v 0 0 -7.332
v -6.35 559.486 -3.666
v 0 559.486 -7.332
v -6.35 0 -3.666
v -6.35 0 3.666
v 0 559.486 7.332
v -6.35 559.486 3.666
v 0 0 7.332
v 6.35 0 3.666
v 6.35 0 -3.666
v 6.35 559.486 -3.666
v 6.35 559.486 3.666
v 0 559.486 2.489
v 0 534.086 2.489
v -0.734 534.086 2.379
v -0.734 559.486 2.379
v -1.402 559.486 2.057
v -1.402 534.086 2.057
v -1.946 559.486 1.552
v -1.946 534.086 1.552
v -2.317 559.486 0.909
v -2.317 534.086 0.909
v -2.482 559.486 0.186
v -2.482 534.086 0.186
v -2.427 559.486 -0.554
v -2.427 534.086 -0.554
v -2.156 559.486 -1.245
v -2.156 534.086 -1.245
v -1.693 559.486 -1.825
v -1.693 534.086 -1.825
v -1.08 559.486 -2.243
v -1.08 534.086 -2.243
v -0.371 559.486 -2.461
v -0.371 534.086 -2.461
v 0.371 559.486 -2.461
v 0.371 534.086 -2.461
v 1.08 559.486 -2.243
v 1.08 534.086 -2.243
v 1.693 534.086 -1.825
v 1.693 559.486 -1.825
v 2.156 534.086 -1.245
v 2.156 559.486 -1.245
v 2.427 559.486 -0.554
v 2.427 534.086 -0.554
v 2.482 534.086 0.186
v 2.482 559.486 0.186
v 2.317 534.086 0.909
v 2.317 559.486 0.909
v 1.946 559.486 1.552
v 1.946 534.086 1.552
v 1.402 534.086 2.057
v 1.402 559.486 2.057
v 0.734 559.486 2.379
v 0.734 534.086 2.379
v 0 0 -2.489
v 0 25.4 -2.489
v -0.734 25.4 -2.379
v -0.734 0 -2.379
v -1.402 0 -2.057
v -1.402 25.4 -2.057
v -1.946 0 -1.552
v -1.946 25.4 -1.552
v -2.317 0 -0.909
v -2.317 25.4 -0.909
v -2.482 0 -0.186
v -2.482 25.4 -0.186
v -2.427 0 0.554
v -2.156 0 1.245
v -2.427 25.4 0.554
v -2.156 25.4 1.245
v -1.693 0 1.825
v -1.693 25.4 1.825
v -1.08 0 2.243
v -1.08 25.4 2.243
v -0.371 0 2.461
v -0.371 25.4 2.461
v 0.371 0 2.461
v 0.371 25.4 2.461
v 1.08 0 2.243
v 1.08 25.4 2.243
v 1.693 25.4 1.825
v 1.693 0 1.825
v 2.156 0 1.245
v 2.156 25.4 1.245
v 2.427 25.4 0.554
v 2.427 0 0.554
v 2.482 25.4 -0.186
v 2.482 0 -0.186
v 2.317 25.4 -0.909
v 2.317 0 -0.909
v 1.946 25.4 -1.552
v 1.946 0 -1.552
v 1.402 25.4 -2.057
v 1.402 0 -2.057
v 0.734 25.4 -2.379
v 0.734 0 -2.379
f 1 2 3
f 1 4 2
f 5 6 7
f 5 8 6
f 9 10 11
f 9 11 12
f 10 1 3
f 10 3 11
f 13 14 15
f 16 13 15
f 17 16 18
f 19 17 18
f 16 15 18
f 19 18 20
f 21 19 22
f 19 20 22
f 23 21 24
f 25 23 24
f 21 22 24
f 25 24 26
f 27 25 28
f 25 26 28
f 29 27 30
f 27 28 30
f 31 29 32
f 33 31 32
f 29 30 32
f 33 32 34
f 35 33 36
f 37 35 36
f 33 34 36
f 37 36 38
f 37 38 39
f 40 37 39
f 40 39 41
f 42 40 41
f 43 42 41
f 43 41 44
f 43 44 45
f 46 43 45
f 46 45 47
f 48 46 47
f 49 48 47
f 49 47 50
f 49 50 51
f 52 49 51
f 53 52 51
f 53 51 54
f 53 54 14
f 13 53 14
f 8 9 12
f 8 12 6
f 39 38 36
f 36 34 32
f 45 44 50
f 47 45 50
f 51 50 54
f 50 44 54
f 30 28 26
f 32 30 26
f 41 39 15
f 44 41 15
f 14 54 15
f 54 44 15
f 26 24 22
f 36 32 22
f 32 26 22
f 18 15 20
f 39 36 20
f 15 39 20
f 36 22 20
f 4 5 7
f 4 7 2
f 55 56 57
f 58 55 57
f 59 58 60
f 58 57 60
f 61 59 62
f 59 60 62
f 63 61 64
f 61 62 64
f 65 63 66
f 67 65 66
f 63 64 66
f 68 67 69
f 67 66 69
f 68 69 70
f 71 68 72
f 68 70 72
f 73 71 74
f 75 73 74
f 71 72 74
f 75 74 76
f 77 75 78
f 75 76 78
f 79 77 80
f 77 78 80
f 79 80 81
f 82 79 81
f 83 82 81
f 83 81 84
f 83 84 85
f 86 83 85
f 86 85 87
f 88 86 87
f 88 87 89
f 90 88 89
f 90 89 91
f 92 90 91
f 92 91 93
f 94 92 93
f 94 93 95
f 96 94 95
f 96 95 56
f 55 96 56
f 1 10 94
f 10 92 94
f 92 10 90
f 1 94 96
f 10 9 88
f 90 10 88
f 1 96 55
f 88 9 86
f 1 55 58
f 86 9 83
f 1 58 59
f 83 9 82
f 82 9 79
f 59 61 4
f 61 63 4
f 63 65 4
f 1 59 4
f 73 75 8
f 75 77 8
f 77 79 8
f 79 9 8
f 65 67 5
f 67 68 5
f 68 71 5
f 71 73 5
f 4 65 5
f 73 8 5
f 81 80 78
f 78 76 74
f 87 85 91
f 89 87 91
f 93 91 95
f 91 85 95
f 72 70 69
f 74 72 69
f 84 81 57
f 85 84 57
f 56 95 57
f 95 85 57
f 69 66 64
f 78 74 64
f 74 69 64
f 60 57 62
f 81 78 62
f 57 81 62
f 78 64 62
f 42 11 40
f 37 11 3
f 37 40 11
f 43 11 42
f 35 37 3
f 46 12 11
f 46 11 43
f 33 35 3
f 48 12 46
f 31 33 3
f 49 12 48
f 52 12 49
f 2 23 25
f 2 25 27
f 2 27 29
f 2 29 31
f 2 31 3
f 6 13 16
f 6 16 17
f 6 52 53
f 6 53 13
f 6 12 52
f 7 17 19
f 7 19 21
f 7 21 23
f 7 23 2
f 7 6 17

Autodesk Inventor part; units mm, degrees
ref_plane "YZ Plane" through (0, 0, 0) normal (1, 0, 0) x (0, 1, 0)
ref_plane "XZ Plane" through (0, 0, 0) normal (0, 1, 0) x (-1, 0, 0)
ref_plane "XY Plane" through (0, 0, 0) normal (0, 0, 1) x (1, 0, 0)
sketch "Sketch1" plane through (0, 0, 0) normal (0, 1, 0) x (-1, 0, 0)
  line L0 (6.35, -3.6662) -> (0, -7.3323)
  line L1 (0, -7.3323) -> (-6.35, -3.6662)
  line L2 (-6.35, -3.6662) -> (-6.35, 3.6662)
  line L3 (-6.35, 3.6662) -> (0, 7.3323)
  line L4 (0, 7.3323) -> (6.35, 3.6662)
  line L5 (6.35, 3.6662) -> (6.35, -3.6662)
  point P0 (0, 0)
  point P1 (0, 0)
  point P2 (0, 0)
  dimension "d0" = 12.7
extrude "Extrusion1" add sketch "Sketch1" along normal blind 559.4858
sketch "Sketch2" plane through (0, 0, 0) normal (0, -1, 0) x (1, 0, 0)
  point P0 (0, 0)
  point P1 (0, 0)
hole "Hole1" at (0, 0, 0) direction (0, 1, 0) diameter 4.9784 depth 25.4 thread size "1/4-20 UNC" class "2B" standard "ANSI Unified Screw Threads"
sketch "Sketch3" plane through (0, 559.4858, 0) normal (0, 1, 0) x (1, 0, 0)
  point P0 (0, 0)
  point P1 (0, 0)
hole "Hole2" at (0, 559.4858, 0) direction (0, -1, 0) diameter 4.9784 depth 25.4 thread size "1/4-20 UNC" class "2B" standard "ANSI Unified Screw Threads"
properties part number "Intake Hex Shaft 3" material "Aluminum 6061"
